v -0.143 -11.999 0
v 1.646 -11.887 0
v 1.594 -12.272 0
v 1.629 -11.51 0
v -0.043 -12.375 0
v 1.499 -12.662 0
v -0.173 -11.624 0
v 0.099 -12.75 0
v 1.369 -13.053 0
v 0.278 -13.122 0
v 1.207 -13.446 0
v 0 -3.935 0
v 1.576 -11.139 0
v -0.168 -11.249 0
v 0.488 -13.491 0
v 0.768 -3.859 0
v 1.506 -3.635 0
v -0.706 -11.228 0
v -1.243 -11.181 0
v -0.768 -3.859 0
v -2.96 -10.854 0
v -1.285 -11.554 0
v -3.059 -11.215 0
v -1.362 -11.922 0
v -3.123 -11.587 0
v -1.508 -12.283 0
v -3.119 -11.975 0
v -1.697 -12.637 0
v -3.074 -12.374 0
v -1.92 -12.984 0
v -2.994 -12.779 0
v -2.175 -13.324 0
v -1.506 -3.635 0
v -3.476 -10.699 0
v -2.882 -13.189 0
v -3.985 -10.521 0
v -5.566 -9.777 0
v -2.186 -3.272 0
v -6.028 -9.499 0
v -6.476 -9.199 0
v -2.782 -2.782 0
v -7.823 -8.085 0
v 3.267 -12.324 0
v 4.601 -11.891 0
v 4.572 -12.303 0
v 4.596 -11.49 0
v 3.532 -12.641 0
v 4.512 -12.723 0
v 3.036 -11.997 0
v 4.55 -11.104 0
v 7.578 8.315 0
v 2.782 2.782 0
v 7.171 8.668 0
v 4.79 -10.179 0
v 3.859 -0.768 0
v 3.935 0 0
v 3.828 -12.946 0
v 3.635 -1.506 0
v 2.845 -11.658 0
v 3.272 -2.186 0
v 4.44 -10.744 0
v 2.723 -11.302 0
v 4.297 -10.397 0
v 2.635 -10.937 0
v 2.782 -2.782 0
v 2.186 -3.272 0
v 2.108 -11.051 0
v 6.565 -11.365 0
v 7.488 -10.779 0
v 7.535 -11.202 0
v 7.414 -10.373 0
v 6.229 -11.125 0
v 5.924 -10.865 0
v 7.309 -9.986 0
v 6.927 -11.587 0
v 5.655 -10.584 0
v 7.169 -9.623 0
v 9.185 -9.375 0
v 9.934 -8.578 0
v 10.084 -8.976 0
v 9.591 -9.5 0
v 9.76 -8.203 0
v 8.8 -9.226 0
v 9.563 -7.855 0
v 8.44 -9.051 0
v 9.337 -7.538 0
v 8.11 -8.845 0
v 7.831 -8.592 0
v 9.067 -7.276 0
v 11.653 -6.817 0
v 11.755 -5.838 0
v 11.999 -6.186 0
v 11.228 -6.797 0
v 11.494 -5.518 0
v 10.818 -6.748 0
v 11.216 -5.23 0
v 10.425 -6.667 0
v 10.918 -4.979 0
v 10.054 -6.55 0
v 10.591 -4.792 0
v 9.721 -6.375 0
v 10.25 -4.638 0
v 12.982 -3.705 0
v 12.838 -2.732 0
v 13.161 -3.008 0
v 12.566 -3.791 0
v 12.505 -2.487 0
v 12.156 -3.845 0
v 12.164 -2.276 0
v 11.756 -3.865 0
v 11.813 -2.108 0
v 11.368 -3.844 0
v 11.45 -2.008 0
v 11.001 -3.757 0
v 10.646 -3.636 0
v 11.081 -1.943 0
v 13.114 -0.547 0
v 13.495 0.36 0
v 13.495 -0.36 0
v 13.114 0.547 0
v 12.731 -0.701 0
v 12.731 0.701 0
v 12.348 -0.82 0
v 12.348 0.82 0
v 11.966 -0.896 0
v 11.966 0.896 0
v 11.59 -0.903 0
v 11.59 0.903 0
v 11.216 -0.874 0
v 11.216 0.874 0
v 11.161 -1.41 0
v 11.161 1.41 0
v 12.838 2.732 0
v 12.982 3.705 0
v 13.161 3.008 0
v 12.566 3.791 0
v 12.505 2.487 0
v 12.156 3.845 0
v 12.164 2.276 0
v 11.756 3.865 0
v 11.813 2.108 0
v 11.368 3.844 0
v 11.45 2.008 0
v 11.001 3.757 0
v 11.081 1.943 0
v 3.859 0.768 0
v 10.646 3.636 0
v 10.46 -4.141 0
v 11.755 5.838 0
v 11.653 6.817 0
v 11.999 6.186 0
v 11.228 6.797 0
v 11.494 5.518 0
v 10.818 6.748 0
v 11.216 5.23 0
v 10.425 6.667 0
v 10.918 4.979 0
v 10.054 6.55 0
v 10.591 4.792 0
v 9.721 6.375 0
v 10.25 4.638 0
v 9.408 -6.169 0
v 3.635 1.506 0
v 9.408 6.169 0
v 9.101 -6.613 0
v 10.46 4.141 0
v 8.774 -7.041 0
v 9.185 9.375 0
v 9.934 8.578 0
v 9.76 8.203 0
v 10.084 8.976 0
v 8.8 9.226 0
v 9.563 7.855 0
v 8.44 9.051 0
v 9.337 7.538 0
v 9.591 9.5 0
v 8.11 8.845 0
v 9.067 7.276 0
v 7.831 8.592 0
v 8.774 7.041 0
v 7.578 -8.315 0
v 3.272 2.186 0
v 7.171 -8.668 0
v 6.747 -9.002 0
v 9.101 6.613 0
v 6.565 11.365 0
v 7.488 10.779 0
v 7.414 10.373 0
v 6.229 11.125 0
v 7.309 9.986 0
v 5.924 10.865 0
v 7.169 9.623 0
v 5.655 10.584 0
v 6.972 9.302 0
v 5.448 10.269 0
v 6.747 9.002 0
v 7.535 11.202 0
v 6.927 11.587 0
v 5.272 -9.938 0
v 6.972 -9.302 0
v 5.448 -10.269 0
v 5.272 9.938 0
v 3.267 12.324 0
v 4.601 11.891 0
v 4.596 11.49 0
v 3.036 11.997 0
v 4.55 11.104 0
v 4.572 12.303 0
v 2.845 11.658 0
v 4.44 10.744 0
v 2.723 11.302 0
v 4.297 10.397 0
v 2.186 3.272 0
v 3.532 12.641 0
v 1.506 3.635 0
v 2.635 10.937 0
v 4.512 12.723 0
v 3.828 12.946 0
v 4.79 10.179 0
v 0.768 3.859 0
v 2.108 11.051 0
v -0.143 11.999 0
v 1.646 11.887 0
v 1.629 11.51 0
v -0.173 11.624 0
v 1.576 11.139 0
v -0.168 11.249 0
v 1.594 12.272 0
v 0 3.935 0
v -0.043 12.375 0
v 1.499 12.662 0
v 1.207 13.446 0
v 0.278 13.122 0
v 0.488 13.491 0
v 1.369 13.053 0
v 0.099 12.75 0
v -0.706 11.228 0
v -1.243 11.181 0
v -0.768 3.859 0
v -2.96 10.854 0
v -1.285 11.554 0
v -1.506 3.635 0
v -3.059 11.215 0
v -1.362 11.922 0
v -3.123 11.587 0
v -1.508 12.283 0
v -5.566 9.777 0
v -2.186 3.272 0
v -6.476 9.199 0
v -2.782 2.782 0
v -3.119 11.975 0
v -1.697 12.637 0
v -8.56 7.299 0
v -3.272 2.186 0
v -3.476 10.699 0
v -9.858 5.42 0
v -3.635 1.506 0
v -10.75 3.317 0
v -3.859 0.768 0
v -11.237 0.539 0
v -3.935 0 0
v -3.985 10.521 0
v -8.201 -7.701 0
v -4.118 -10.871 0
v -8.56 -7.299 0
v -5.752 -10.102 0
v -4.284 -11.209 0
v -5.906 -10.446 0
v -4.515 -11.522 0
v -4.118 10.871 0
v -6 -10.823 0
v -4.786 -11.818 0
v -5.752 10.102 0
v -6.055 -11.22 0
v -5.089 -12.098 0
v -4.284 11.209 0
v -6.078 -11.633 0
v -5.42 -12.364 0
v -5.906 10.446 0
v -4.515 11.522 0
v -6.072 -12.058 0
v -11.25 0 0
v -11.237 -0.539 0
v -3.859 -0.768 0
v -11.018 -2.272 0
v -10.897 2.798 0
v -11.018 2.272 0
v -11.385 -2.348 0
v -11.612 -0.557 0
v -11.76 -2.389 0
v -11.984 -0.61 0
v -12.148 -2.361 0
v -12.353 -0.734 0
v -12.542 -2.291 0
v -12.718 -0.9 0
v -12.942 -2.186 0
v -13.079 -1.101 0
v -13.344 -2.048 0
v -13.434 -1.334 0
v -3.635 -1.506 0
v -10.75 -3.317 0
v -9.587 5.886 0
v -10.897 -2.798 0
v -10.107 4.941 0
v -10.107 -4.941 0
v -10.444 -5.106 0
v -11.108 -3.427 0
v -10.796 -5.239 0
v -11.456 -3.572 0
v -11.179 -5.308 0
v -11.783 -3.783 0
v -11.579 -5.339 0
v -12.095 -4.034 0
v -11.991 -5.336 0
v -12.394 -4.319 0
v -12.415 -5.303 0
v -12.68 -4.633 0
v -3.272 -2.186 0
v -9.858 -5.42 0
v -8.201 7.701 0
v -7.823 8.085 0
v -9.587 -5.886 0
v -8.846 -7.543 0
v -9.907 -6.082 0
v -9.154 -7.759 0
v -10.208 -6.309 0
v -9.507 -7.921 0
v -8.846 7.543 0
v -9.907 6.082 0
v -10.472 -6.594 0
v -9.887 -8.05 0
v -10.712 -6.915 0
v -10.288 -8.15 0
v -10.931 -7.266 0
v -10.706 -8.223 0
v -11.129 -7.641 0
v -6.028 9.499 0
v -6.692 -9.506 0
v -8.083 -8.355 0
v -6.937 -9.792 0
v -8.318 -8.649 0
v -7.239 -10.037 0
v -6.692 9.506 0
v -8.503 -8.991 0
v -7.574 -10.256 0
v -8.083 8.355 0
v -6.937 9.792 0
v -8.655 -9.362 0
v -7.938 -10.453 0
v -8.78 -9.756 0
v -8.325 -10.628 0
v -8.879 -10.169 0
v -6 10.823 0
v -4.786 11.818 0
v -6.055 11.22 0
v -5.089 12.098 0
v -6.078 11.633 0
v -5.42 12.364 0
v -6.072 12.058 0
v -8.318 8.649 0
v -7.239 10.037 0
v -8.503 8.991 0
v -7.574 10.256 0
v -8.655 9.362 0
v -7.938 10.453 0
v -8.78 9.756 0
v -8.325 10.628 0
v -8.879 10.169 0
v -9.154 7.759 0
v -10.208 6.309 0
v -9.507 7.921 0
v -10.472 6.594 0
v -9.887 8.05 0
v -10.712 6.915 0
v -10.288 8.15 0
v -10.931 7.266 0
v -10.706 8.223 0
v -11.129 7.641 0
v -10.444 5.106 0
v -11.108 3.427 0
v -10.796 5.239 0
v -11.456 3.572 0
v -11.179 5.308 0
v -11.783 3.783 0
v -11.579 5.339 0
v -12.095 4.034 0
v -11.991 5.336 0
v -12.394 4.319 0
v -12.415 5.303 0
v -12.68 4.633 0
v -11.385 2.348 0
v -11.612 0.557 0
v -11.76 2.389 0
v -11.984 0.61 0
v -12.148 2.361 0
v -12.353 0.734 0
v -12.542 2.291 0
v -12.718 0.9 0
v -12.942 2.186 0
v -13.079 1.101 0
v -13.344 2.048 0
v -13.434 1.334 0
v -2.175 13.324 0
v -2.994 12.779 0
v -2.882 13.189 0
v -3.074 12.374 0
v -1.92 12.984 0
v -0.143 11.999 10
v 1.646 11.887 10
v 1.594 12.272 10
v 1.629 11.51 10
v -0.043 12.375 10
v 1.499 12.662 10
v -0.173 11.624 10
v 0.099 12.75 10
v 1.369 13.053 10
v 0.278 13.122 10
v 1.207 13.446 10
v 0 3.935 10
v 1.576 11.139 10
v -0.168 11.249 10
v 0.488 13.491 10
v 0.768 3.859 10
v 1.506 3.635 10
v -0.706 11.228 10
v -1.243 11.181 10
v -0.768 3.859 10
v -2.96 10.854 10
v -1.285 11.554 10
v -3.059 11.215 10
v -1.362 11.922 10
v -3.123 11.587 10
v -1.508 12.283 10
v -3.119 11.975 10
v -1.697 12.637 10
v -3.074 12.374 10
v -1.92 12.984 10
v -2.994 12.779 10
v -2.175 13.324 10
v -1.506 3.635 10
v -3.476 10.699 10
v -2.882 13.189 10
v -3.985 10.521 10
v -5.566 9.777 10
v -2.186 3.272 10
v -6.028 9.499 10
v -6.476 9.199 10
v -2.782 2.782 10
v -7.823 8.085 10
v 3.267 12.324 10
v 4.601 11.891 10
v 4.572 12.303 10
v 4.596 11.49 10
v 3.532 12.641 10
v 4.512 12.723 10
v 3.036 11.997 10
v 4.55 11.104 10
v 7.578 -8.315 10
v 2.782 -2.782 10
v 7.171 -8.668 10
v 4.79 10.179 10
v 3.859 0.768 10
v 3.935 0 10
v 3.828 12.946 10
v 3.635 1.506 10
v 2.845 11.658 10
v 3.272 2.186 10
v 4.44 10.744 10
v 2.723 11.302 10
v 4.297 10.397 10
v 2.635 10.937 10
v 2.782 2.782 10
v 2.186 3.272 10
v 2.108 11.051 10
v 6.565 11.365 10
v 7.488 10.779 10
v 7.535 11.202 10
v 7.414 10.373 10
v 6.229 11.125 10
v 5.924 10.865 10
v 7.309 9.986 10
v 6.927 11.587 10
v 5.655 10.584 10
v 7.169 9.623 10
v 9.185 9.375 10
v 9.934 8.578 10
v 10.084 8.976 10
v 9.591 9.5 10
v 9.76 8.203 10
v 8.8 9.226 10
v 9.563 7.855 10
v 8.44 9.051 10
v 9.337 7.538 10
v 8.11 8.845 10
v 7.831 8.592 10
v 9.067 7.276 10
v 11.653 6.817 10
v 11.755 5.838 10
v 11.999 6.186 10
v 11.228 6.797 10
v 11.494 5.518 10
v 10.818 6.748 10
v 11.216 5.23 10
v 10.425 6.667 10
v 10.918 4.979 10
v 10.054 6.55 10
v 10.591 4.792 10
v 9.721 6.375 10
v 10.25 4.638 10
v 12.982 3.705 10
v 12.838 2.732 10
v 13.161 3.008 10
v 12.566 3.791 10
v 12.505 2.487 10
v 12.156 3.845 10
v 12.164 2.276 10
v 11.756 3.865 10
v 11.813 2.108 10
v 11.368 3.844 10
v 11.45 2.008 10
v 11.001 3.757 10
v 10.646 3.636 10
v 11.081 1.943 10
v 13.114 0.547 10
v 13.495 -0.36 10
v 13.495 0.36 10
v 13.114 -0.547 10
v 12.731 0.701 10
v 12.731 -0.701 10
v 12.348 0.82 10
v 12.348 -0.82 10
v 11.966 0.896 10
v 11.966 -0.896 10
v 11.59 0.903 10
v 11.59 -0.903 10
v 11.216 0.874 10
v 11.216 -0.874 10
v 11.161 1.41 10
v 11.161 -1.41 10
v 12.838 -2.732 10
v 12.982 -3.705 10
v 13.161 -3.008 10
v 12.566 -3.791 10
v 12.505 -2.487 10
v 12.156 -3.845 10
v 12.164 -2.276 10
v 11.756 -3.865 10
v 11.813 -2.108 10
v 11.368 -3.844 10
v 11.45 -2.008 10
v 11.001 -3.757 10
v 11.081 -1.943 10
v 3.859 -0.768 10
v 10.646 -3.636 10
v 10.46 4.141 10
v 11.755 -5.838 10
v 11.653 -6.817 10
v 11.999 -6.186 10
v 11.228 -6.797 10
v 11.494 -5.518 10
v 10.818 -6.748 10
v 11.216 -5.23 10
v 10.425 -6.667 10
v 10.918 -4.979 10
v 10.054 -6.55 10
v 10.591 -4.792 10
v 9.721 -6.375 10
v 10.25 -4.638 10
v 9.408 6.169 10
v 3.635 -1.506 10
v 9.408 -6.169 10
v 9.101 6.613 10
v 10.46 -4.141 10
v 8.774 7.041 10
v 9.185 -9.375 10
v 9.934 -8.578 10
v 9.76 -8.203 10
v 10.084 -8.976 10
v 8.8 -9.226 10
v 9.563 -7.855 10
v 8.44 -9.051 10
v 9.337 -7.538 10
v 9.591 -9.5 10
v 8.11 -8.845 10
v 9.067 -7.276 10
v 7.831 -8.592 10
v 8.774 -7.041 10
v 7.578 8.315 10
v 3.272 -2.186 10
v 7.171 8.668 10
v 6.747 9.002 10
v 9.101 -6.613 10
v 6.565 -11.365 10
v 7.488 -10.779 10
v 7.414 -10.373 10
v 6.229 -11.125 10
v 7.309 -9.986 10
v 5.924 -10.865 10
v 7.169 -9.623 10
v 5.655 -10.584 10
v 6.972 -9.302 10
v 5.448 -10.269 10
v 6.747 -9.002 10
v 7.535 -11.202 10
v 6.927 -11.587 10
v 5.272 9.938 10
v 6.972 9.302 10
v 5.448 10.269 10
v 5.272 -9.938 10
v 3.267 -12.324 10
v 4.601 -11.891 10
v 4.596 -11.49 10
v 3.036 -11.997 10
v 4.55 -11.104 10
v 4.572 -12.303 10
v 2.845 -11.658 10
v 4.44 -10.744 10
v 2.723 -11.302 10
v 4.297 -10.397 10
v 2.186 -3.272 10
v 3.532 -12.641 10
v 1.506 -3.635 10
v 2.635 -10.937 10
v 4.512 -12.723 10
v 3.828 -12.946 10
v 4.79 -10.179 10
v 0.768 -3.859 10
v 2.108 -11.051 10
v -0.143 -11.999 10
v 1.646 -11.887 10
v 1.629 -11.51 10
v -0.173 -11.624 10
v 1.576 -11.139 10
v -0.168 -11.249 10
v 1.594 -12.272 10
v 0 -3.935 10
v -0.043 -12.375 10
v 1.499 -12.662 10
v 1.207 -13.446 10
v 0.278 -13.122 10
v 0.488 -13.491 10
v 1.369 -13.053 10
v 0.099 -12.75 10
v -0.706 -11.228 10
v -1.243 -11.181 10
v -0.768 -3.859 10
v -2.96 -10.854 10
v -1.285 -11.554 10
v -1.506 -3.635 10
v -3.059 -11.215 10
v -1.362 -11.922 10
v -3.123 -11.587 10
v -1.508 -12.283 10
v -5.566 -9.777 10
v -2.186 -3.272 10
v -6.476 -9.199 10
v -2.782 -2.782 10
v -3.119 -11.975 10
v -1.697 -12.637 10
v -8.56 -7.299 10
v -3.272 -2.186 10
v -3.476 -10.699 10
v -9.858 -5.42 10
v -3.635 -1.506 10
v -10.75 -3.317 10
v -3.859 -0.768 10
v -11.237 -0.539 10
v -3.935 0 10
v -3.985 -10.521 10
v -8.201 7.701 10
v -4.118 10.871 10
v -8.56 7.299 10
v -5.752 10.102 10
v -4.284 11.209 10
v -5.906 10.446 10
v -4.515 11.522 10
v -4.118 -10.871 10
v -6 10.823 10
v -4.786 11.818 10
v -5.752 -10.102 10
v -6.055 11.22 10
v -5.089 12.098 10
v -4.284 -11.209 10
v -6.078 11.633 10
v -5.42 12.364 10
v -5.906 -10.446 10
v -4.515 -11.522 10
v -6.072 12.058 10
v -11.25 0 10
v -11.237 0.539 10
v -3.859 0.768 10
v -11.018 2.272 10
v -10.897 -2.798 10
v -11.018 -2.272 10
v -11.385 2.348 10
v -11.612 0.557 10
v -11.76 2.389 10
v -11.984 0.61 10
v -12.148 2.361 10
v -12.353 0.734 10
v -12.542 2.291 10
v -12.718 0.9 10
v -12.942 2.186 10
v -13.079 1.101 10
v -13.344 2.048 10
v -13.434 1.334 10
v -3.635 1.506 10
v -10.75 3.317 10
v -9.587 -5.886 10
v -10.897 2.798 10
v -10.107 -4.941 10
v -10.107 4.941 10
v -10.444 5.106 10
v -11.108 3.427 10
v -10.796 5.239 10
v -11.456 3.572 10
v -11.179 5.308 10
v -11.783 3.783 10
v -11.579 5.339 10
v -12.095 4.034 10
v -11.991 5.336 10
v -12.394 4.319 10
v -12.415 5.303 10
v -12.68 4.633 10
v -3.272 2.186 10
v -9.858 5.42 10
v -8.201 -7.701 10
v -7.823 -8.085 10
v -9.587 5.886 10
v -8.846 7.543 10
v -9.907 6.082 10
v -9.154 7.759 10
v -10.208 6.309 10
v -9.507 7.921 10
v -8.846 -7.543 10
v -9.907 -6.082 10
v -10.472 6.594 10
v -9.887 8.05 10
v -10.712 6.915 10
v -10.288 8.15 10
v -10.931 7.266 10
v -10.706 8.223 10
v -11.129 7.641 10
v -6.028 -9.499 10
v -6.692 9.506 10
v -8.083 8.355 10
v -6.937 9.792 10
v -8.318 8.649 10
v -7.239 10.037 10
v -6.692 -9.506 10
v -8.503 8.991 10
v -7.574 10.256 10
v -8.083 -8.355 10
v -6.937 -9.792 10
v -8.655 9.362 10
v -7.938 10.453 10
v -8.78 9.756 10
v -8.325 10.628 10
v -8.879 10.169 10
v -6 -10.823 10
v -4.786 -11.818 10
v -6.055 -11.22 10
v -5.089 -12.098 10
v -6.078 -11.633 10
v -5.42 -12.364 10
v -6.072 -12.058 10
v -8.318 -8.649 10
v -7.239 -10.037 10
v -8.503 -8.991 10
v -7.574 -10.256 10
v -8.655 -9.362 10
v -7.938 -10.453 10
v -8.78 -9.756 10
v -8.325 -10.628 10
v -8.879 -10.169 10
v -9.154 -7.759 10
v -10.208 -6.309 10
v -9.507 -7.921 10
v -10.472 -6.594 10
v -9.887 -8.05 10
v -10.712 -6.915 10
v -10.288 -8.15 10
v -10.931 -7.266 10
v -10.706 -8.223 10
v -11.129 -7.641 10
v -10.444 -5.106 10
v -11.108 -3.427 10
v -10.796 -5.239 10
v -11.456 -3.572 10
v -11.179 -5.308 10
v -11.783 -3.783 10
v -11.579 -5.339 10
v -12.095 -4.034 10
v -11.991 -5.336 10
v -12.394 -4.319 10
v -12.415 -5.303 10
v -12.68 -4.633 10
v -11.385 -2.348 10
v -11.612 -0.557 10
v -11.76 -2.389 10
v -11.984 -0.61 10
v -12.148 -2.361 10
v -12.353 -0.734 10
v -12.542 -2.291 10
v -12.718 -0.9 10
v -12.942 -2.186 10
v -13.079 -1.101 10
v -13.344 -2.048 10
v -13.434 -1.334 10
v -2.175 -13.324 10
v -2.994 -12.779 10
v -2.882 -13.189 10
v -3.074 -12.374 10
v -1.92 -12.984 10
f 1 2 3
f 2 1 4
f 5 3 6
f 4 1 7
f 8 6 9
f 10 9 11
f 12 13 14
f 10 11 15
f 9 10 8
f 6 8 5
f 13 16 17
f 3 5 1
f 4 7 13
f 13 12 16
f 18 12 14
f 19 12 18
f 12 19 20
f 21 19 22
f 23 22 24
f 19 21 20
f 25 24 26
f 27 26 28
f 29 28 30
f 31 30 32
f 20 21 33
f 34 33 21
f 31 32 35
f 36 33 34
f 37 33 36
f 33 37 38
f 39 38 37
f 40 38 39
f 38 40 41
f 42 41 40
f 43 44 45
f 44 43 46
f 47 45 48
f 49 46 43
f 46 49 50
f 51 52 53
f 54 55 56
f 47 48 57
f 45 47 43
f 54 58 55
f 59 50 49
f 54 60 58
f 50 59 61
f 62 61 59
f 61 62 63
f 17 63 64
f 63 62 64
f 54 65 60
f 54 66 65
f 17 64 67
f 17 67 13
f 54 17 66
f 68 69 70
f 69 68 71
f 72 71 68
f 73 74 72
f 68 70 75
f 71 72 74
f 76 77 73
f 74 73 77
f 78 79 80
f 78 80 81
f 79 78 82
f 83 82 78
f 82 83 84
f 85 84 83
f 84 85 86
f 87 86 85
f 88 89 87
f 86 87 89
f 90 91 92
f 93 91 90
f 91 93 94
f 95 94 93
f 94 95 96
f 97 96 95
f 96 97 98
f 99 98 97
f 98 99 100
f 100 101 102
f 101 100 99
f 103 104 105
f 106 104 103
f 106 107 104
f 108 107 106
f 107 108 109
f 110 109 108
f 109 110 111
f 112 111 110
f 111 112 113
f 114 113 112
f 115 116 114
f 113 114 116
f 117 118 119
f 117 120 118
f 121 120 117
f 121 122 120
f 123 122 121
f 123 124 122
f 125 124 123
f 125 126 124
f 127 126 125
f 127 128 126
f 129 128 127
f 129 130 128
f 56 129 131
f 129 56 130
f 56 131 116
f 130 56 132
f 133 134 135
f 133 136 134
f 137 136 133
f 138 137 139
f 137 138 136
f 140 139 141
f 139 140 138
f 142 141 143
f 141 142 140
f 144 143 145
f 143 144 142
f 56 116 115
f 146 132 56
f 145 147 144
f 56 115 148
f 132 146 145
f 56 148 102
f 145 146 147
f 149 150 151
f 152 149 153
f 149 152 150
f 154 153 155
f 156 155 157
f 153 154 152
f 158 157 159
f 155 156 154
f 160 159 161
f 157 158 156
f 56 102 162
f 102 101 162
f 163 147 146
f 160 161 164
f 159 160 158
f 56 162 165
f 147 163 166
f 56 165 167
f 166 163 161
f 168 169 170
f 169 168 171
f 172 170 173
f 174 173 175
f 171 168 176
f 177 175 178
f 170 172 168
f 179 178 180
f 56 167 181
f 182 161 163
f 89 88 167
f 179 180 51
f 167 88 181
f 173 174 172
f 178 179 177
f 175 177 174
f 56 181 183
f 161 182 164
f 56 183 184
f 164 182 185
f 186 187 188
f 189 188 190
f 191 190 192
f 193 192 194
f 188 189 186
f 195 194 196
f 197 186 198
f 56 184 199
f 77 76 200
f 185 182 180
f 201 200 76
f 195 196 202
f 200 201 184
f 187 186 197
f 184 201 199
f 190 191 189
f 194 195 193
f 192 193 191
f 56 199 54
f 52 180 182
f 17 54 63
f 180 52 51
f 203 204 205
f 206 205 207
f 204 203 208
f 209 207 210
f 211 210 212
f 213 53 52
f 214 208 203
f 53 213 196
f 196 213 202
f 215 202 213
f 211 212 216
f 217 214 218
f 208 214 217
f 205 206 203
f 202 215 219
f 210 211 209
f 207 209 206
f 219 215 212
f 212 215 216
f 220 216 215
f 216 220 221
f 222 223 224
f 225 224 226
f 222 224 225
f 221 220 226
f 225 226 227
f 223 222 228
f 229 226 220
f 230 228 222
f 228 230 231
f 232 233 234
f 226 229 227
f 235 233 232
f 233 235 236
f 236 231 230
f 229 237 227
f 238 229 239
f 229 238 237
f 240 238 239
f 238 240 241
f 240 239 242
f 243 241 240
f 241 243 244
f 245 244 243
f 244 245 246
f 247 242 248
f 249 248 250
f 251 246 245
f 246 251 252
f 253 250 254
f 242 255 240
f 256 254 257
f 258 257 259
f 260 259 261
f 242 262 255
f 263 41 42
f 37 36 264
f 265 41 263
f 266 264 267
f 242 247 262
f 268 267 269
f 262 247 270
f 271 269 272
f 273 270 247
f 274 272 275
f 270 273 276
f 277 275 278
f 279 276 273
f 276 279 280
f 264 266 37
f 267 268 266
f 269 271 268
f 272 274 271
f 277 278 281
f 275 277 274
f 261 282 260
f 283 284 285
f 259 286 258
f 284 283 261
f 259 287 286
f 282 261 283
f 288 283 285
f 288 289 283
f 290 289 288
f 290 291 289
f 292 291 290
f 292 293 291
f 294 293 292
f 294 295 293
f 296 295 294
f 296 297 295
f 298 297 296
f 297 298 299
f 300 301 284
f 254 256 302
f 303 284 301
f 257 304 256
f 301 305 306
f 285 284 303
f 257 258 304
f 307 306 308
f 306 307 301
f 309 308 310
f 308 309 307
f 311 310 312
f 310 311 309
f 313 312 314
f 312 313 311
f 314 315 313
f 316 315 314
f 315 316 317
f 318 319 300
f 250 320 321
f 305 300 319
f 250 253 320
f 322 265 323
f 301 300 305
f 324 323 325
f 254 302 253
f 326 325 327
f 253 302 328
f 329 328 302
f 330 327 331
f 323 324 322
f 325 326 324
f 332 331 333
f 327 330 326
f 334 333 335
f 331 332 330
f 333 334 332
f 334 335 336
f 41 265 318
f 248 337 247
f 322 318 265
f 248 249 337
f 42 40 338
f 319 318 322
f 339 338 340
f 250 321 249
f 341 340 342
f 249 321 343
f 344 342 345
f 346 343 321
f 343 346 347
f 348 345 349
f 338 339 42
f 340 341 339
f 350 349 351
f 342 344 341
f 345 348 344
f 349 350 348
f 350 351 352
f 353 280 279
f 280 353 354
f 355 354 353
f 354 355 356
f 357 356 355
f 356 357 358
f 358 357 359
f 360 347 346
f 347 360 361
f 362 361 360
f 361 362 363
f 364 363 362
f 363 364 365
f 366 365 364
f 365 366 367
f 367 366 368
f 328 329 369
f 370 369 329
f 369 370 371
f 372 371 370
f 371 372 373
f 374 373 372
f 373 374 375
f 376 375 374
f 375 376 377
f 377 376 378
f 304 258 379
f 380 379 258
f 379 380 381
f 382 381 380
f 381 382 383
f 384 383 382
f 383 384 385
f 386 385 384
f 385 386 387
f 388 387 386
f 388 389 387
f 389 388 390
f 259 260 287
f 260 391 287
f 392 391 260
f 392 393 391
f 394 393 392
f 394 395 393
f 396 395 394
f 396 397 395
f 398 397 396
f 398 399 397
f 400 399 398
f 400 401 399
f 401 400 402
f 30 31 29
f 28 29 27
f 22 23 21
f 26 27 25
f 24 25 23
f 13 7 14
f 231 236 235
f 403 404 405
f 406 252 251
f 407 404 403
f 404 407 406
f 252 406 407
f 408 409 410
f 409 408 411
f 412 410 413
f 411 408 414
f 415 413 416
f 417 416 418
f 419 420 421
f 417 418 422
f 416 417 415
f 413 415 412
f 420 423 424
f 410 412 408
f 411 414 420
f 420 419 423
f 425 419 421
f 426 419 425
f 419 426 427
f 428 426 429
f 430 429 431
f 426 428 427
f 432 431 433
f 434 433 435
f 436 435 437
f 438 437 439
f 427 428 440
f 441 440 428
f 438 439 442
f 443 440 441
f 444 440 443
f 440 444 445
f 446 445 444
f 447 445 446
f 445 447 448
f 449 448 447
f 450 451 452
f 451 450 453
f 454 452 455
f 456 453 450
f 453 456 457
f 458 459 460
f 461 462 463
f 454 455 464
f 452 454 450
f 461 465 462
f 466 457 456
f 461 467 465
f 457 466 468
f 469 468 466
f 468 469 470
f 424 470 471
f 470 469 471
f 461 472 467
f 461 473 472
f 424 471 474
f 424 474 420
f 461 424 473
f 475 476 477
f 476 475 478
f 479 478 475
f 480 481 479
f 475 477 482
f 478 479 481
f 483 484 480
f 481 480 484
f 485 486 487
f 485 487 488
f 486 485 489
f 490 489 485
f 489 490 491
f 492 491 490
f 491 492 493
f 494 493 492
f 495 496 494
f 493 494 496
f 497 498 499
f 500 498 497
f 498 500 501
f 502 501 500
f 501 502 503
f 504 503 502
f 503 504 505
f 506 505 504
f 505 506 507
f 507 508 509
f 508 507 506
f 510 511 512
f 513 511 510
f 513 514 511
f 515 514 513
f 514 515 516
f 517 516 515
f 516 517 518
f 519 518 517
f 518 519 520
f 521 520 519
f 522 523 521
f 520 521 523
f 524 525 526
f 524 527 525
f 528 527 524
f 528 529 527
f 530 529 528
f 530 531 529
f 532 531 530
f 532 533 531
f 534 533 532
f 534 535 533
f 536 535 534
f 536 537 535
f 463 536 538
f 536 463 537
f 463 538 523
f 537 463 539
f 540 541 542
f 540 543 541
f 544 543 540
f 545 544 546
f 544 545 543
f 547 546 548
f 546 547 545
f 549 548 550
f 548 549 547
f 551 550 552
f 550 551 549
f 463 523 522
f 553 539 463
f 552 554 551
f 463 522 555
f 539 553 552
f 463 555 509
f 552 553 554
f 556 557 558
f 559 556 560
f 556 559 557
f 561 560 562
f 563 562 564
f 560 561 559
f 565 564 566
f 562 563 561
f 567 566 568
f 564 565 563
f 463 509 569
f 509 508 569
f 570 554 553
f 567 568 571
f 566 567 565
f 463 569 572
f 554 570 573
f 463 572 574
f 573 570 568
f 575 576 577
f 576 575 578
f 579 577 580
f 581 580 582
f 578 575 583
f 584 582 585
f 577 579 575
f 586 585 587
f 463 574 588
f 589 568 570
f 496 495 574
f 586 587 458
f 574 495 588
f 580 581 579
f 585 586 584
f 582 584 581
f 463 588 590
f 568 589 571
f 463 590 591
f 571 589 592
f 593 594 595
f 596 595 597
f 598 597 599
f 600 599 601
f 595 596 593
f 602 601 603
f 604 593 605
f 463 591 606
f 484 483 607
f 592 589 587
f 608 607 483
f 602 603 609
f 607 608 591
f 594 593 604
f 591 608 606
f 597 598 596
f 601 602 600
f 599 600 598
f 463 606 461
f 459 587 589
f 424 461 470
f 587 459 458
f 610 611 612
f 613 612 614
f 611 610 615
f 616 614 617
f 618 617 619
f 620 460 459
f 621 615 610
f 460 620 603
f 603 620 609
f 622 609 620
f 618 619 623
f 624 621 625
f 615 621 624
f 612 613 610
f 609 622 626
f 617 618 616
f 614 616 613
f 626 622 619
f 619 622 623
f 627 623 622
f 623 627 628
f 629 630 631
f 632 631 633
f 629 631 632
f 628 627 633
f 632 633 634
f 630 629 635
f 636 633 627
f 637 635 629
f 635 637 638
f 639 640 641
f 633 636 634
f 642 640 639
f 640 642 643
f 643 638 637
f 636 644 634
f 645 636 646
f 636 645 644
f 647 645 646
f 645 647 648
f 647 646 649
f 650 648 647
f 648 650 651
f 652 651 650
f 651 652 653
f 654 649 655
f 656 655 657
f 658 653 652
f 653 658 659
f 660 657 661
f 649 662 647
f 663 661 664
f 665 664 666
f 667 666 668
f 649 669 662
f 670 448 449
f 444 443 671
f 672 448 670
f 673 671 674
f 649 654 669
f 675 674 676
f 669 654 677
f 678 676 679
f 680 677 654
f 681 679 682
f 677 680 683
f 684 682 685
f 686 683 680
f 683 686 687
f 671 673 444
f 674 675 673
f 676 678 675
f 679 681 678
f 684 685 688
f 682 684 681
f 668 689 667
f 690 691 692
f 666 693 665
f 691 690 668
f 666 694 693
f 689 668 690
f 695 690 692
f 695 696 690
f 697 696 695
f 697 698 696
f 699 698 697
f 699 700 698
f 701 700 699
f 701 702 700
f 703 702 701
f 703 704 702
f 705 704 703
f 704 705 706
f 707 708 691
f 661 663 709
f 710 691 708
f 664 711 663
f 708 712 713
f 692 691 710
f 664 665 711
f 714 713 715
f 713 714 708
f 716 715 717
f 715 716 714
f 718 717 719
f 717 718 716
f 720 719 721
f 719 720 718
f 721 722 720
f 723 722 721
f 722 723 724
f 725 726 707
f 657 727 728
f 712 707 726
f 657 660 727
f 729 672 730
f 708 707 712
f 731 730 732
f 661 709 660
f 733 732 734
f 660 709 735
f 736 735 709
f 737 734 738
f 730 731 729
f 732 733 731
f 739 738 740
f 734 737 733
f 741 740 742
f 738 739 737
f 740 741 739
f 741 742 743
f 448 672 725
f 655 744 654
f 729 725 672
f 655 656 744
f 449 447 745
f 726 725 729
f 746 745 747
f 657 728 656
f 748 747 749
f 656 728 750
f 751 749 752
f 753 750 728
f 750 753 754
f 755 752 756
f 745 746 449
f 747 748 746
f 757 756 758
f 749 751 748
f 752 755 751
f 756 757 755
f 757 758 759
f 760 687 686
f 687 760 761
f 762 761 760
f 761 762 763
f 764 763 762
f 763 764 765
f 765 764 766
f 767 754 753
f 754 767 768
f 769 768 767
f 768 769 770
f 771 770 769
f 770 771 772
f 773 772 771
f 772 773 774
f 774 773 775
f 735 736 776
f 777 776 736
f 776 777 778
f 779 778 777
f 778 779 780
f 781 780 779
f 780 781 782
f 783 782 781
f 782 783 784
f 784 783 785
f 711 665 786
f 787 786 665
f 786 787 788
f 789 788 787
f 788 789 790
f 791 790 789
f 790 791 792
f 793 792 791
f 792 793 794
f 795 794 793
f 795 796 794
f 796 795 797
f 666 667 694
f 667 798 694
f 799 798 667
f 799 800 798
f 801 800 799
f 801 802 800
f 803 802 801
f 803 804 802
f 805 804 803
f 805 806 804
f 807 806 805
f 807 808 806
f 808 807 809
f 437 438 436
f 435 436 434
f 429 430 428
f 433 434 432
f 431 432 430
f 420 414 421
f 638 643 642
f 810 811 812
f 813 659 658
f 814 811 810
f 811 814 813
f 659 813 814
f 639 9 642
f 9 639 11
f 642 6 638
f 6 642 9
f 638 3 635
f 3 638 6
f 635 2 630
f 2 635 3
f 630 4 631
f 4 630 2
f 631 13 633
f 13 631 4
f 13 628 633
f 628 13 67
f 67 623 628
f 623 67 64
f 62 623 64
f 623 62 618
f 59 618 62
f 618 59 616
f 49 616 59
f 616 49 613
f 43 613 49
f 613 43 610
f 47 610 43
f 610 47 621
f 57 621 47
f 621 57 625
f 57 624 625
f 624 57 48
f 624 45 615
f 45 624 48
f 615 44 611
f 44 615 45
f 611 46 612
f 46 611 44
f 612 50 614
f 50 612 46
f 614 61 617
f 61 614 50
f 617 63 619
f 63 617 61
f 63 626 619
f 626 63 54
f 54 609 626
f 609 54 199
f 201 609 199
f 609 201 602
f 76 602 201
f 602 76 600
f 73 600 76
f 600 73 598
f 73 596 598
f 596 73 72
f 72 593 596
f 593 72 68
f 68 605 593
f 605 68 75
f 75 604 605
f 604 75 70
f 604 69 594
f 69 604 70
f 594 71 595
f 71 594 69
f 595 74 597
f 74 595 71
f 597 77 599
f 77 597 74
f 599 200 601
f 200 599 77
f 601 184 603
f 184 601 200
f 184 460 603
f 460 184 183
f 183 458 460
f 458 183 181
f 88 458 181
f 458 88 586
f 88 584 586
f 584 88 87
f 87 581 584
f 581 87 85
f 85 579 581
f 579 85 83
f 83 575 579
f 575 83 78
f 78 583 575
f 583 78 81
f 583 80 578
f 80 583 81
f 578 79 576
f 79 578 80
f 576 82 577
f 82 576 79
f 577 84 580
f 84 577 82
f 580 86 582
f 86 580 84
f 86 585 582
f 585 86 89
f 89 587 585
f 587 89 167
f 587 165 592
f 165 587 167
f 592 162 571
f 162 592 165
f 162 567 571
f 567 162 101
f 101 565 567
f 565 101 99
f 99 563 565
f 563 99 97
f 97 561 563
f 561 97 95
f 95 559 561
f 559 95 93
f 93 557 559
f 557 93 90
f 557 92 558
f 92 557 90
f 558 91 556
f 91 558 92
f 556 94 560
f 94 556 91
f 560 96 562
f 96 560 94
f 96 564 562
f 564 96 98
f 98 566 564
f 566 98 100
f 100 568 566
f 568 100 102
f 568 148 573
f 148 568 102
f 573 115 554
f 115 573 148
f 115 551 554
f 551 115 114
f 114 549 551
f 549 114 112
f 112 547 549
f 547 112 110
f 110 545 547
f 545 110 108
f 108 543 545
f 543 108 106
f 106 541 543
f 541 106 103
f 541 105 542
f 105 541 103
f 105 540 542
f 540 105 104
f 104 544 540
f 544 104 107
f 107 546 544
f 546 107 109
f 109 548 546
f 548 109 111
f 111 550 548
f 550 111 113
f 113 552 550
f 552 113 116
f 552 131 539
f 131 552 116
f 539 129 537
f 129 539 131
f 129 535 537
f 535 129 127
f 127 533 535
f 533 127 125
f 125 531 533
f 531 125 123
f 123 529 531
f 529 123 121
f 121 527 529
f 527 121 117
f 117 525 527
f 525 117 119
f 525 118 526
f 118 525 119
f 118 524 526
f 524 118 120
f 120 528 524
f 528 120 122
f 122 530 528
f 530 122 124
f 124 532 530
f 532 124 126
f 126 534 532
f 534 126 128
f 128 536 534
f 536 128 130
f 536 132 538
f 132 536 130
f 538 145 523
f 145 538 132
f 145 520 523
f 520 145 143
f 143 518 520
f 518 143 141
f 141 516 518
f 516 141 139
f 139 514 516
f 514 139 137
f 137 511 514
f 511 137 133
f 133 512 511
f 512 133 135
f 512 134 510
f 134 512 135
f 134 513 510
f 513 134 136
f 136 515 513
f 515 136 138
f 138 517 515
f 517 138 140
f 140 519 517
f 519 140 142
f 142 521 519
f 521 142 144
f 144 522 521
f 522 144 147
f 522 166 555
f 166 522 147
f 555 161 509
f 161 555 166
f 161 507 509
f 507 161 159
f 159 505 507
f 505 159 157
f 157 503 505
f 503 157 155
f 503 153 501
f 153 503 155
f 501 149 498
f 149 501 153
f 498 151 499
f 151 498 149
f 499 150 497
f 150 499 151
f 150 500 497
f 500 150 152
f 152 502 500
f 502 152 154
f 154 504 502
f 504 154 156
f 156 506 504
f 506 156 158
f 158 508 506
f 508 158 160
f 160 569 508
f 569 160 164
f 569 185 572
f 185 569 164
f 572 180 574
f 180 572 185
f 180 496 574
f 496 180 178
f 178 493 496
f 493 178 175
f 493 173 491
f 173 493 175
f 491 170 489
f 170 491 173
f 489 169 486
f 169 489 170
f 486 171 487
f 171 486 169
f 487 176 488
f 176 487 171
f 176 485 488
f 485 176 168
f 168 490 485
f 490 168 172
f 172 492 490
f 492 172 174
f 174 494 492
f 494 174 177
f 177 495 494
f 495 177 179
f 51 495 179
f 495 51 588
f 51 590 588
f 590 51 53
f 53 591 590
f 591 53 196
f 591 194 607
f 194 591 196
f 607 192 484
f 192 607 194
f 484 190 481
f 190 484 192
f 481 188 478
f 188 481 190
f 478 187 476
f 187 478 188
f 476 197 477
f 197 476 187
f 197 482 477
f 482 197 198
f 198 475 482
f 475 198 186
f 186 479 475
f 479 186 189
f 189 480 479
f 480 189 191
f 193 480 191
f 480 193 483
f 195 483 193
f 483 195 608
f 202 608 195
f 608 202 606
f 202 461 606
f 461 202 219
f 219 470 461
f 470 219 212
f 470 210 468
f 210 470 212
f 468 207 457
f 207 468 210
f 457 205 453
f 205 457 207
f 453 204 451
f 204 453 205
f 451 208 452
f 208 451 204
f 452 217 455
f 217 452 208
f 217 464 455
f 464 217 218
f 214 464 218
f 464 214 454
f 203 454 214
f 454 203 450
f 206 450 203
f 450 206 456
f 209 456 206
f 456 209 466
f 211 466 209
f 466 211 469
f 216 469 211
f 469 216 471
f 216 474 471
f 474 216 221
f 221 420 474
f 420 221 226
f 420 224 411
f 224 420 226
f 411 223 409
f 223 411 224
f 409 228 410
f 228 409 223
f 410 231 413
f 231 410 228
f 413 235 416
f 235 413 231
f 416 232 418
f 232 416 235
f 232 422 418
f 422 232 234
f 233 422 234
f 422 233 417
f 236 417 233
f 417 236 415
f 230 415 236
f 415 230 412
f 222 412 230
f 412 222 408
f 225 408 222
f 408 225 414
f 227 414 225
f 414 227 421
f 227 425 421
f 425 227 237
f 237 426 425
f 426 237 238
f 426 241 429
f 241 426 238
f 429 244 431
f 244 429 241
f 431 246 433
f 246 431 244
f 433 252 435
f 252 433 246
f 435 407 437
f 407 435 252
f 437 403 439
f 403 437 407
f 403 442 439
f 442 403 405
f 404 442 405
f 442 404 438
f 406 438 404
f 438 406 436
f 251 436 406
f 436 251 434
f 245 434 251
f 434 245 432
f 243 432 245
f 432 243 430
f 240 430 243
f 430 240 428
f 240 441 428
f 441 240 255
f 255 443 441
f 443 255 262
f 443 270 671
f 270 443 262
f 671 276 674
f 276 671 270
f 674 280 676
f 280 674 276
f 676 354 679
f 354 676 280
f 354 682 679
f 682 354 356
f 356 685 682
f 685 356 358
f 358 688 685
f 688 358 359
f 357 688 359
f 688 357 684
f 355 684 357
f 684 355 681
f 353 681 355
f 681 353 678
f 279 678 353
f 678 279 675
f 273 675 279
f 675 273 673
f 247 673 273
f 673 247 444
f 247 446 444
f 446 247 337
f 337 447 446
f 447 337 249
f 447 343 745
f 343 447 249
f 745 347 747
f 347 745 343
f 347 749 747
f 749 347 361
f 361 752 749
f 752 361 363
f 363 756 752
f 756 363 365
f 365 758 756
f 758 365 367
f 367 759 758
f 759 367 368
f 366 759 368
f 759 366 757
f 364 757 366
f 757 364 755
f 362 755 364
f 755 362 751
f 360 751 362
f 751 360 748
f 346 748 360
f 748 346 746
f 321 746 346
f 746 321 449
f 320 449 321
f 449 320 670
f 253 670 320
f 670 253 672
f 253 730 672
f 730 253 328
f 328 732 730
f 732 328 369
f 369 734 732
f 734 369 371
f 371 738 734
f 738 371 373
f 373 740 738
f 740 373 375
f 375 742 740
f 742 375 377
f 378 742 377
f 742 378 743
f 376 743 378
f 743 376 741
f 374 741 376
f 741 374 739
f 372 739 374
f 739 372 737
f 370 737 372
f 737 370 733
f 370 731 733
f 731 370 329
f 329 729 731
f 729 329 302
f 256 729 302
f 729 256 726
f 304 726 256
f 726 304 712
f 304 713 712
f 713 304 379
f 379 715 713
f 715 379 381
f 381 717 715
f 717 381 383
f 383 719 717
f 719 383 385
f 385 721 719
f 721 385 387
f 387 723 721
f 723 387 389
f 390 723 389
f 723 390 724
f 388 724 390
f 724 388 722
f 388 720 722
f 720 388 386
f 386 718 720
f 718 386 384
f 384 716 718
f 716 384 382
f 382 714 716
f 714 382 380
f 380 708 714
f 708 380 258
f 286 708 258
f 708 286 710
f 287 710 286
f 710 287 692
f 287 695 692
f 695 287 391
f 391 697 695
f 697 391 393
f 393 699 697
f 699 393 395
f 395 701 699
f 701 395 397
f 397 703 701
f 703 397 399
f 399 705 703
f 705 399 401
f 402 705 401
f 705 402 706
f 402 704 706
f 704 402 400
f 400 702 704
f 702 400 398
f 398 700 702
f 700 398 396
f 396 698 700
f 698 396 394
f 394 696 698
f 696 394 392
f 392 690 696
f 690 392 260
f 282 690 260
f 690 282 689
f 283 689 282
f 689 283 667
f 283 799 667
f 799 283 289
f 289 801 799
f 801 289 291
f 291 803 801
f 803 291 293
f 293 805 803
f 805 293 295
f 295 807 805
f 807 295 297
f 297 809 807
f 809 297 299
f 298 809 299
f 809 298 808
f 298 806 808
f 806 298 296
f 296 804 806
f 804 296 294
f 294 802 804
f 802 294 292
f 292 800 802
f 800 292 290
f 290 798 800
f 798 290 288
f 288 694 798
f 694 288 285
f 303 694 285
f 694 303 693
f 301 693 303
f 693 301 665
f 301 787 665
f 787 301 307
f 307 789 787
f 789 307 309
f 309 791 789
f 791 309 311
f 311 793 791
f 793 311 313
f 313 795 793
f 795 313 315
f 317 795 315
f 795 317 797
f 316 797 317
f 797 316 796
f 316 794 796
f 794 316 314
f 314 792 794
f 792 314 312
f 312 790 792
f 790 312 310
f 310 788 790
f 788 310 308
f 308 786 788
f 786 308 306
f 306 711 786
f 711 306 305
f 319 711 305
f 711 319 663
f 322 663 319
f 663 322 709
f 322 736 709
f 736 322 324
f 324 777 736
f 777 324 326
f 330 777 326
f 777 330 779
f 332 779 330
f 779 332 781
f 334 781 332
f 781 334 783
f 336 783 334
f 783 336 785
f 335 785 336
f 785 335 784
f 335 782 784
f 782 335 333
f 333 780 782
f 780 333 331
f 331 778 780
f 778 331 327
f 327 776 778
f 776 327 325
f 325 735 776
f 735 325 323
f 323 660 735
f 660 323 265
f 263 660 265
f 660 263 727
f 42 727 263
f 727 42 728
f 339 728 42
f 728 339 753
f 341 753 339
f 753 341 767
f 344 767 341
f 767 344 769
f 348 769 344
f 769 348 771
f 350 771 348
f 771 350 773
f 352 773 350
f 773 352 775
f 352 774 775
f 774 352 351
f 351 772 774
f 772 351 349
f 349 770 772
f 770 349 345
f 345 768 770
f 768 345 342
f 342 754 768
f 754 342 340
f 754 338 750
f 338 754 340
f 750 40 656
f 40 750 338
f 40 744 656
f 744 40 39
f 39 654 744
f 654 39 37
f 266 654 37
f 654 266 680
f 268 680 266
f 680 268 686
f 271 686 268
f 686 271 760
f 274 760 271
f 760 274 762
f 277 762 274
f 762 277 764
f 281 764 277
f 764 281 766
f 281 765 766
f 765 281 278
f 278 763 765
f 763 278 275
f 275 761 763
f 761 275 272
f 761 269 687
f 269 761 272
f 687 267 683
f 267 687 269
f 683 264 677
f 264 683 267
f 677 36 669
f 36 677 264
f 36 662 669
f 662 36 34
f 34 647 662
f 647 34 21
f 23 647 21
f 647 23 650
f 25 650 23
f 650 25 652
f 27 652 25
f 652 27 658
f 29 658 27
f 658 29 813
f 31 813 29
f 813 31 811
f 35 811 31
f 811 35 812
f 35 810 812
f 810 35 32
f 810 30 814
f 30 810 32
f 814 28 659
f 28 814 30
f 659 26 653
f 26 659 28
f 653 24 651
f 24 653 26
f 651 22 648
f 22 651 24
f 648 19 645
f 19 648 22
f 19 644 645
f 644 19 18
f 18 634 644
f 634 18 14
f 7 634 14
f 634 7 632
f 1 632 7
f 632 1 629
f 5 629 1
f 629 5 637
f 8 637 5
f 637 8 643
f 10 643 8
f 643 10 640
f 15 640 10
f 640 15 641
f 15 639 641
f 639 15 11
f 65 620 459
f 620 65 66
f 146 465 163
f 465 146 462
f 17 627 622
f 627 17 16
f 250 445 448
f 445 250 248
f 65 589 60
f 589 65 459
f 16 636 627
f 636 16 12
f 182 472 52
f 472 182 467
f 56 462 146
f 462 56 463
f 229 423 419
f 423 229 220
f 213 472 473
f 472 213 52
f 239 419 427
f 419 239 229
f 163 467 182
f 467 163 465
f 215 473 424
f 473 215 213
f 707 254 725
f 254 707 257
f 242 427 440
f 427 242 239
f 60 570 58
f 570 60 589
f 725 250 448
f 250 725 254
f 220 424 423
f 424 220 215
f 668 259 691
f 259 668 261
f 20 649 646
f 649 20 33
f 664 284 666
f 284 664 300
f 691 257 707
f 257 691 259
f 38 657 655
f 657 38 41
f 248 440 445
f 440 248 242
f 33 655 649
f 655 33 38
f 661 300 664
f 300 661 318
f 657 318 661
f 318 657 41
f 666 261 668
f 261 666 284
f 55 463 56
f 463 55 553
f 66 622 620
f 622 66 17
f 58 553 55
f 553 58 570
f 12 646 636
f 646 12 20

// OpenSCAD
$fn = 32;

// ----------------------------------------------------------------------
// Spur gear: m=1 z=25, 27 mm tip diameter x 10 mm
// ----------------------------------------------------------------------

// --- parameters (mm) ---
modul = 1;                // module
n_teeth = 25;             // number of teeth
width = 10;               // face width
pa = 20;                  // pressure angle, deg
shaft_d = 7.87;           // shaft bore

/* --- involute profile --- */
pitch_r = modul * n_teeth / 2;
base_r = pitch_r * cos(pa);
tip_r = pitch_r + modul;
root_r = pitch_r - 1.25 * modul;
flank_steps = 6;

function inv_deg(a) = (tan(a) - a * PI / 180) * 180 / PI;
function flank_r(i) = root_r + (tip_r - root_r) * i / flank_steps;
function half_angle(r) = 90 / n_teeth + inv_deg(pa) - inv_deg(acos(min(1, base_r / r)));
function tooth_pt(k, i, side) =
    let (r = flank_r(i), a = k * 360 / n_teeth + side * half_angle(r))
    [r * cos(a), r * sin(a)];

module tooth_profile() {
  polygon(points = [
    for (k = [0 : n_teeth - 1])
      each [
        for (i = [0 : flank_steps]) tooth_pt(k, i, -1),
        for (i = [flank_steps : -1 : 0]) tooth_pt(k, i, 1),
        let (ta = (k + 0.5) * 360 / n_teeth)
          [root_r * cos(ta), root_r * sin(ta)]
      ]
  ]);
}

module gear_disc() {
  linear_extrude(height = width) tooth_profile();
}

difference() {
  gear_disc();
  translate([0, 0, -1]) cylinder(h = width + 3, d = shaft_d);
}
